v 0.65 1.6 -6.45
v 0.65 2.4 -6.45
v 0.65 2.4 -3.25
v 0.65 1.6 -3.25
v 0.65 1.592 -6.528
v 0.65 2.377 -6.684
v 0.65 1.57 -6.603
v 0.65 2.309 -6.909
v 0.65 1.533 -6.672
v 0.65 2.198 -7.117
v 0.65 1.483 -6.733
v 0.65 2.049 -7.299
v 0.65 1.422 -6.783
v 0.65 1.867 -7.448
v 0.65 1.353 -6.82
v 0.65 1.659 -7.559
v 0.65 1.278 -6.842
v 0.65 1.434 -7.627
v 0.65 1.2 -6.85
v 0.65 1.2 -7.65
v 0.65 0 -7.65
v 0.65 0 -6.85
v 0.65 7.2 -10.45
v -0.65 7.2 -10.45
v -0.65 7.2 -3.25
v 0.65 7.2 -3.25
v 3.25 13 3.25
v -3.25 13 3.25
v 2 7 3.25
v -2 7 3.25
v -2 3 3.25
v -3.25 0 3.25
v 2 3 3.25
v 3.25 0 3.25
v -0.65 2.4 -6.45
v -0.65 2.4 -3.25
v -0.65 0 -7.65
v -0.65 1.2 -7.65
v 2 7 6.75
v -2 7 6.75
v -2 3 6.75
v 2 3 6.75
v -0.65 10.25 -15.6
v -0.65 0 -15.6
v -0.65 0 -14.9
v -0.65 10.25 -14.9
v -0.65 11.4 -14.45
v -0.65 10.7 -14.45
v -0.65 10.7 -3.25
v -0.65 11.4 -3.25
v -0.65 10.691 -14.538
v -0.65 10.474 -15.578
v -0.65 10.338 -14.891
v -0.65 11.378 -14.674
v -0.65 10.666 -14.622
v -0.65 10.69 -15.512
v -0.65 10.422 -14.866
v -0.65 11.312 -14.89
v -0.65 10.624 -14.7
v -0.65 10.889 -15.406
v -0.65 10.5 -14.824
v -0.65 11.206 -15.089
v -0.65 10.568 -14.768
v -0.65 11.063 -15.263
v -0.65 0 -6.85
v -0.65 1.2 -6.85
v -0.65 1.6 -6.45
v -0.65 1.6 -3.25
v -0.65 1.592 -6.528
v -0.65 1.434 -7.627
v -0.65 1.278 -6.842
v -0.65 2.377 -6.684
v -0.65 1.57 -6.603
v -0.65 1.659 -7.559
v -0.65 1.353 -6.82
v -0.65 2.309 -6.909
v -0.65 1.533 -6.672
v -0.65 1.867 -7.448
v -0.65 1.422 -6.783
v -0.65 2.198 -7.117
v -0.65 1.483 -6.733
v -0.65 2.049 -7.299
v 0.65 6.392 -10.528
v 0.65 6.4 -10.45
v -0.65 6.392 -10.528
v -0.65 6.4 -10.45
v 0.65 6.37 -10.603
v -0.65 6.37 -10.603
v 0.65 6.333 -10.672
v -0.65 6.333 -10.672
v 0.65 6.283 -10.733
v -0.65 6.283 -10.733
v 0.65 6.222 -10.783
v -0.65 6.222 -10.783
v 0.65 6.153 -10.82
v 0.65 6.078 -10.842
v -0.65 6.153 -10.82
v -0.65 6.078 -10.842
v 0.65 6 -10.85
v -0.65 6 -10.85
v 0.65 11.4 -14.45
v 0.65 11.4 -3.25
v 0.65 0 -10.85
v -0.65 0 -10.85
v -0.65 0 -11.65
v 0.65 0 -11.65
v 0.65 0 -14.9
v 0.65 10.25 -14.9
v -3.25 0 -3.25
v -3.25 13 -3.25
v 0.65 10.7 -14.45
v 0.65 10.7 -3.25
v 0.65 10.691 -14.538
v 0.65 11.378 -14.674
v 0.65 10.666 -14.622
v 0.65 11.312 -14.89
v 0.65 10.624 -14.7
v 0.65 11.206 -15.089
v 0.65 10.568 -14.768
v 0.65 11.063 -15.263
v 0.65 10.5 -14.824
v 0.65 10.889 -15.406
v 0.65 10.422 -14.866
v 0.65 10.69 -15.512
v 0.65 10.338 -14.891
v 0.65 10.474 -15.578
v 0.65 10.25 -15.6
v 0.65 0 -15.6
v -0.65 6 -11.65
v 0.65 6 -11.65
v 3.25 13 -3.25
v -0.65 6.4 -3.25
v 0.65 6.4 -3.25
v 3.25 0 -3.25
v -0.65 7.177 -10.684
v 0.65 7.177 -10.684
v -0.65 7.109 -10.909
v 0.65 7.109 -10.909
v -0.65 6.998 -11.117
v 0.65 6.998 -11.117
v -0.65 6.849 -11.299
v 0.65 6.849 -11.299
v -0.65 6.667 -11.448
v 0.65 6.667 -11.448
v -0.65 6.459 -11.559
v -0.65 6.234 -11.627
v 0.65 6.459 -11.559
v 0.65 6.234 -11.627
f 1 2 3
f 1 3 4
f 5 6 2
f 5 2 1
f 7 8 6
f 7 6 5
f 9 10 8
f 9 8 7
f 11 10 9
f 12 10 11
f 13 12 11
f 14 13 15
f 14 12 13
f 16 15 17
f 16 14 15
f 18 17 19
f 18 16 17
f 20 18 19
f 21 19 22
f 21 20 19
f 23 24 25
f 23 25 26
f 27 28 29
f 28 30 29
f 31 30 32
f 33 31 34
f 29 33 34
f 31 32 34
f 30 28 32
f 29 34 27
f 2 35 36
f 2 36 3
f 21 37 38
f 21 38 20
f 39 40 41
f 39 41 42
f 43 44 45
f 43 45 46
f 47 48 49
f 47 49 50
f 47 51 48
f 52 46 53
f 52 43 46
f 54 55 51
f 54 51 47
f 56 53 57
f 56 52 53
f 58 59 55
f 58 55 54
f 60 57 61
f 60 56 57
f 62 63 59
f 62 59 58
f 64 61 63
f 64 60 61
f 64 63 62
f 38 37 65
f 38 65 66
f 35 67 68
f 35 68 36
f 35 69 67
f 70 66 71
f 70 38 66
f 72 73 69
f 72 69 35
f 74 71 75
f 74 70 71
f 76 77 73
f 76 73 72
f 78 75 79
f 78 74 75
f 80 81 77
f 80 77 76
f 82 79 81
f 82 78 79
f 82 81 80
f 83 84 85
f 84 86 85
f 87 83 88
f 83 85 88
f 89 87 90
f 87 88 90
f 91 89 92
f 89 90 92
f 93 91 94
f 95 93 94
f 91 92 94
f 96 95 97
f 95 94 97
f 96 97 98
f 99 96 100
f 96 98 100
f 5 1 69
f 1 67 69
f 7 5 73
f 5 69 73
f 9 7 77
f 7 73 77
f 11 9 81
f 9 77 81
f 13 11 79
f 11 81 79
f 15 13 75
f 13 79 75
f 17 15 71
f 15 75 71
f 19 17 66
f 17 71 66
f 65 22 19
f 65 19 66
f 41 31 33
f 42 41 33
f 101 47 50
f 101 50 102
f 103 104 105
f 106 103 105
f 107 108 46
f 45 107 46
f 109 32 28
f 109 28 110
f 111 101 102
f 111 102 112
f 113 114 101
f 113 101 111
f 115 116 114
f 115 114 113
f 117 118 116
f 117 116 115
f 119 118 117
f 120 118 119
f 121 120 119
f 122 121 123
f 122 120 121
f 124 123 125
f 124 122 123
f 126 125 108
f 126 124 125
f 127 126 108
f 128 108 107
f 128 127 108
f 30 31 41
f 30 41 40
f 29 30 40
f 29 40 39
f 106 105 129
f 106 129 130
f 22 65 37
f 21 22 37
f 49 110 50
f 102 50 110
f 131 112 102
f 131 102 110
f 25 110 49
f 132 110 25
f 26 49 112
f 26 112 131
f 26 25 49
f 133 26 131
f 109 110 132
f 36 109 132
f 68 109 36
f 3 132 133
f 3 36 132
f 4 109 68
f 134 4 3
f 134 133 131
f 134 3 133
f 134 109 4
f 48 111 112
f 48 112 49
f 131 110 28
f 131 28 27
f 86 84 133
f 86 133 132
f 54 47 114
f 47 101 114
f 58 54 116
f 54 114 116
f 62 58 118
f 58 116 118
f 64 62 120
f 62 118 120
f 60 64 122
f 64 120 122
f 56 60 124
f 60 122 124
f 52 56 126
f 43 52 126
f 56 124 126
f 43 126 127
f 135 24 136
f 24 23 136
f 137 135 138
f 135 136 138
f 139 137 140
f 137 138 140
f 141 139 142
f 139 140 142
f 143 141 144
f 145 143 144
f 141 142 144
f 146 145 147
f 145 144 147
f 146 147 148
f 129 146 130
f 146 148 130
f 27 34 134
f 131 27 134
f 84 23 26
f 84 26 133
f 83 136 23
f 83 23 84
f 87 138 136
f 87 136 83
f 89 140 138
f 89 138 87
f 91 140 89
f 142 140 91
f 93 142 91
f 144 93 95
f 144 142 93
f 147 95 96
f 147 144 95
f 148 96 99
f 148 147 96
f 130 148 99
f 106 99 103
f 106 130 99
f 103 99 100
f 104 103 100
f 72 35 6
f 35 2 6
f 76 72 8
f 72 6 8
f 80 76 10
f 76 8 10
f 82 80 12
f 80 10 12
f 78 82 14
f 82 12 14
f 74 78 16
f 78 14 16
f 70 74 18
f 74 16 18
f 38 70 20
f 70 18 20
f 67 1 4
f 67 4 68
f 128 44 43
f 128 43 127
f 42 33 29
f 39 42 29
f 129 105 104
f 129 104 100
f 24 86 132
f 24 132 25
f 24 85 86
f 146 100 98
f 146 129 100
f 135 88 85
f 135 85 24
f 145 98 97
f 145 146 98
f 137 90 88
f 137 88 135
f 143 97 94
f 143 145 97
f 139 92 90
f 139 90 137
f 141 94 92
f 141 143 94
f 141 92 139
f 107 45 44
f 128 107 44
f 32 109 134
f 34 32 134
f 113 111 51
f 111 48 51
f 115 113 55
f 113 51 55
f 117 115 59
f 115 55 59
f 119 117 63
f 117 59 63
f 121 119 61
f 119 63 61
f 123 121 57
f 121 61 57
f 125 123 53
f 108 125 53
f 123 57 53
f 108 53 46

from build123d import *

# Parameters (mm, degrees)
SKICA1_W                = 6.5
SKICA1_H                = 6.5
P_IDAT_VYSUNUT_M1_DEPTH = 13
SKICA2_W                = 4
SKICA2_H                = 4
P_IDAT_VYSUNUT_M2_DEPTH = 3.5
SKICA3_W                = 1.3
SKICA3_H                = 0.7
SKICA5_W                = 1.3
SKICA5_H                = 0.8
SKICA7_W                = 1.3
SKICA7_H                = 0.8


with BuildPart() as part:
    # Skica1 → Přidat vysunutím1 (new body)
    with BuildSketch(Plane(origin=(0, 0, 0), x_dir=(1, 0, 0), z_dir=(0, 1, 0))):
        Rectangle(SKICA1_W, SKICA1_H)
    extrude(amount=P_IDAT_VYSUNUT_M1_DEPTH)

    # Skica2 → Přidat vysunutím2 (add)
    with BuildSketch(Plane.XY.offset(3.25)):
        with Locations((0, 5)):
            Rectangle(SKICA2_W, SKICA2_H)
    extrude(amount=P_IDAT_VYSUNUT_M2_DEPTH)

    # Táhnout po křivce1: sweep along a path in Skica4
    with BuildLine(Plane(origin=(0, 0, 0), x_dir=(0, 0, -1), z_dir=(1, 0, 0))) as t_hnout_po_k_ivce1_path:
        Line((3.25, 11.05), (14.45, 11.05))
        ThreePointArc((14.45, 11.05), (15.015685425, 10.815685425), (15.25, 10.25))
        Line((15.25, 10.25), (15.25, 0))
    # Skica3 → Táhnout po křivce1 (sweep)
    with BuildSketch(Plane(origin=(0, 0, -3.25), x_dir=(-1, 0, 0), z_dir=(0, 0, -1))):
        with Locations((0, 11.05)):
            Rectangle(SKICA3_W, SKICA3_H)
    sweep(path=t_hnout_po_k_ivce1_path.line)

    # Táhnout po křivce2: sweep along a path in Skica6
    with BuildLine(Plane(origin=(0, 0, 0), x_dir=(0, 0, -1), z_dir=(1, 0, 0))) as t_hnout_po_k_ivce2_path:
        Line((3.25, 6.8), (10.45, 6.8))
        ThreePointArc((10.45, 6.8), (11.015685425, 6.565685425), (11.25, 6))
        Line((11.25, 6), (11.25, 0))
    # Skica5 → Táhnout po křivce2 (sweep)
    with BuildSketch(Plane(origin=(0, 0, -3.25), x_dir=(-1, 0, 0), z_dir=(0, 0, -1))):
        with Locations((0, 6.8)):
            Rectangle(SKICA5_W, SKICA5_H)
    sweep(path=t_hnout_po_k_ivce2_path.line)

    # Táhnout po křivce3: sweep along a path in Skica8
    with BuildLine(Plane(origin=(0, 0, 0), x_dir=(0, 0, -1), z_dir=(1, 0, 0))) as t_hnout_po_k_ivce3_path:
        Line((3.25, 2), (6.45, 2))
        ThreePointArc((6.45, 2), (7.015685425, 1.765685425), (7.25, 1.2))
        Line((7.25, 1.2), (7.25, 0))
    # Skica7 → Táhnout po křivce3 (sweep)
    with BuildSketch(Plane(origin=(0, 0, -3.25), x_dir=(-1, 0, 0), z_dir=(0, 0, -1))):
        with Locations((0, 2)):
            Rectangle(SKICA7_W, SKICA7_H)
    sweep(path=t_hnout_po_k_ivce3_path.line)


solid = part.part
